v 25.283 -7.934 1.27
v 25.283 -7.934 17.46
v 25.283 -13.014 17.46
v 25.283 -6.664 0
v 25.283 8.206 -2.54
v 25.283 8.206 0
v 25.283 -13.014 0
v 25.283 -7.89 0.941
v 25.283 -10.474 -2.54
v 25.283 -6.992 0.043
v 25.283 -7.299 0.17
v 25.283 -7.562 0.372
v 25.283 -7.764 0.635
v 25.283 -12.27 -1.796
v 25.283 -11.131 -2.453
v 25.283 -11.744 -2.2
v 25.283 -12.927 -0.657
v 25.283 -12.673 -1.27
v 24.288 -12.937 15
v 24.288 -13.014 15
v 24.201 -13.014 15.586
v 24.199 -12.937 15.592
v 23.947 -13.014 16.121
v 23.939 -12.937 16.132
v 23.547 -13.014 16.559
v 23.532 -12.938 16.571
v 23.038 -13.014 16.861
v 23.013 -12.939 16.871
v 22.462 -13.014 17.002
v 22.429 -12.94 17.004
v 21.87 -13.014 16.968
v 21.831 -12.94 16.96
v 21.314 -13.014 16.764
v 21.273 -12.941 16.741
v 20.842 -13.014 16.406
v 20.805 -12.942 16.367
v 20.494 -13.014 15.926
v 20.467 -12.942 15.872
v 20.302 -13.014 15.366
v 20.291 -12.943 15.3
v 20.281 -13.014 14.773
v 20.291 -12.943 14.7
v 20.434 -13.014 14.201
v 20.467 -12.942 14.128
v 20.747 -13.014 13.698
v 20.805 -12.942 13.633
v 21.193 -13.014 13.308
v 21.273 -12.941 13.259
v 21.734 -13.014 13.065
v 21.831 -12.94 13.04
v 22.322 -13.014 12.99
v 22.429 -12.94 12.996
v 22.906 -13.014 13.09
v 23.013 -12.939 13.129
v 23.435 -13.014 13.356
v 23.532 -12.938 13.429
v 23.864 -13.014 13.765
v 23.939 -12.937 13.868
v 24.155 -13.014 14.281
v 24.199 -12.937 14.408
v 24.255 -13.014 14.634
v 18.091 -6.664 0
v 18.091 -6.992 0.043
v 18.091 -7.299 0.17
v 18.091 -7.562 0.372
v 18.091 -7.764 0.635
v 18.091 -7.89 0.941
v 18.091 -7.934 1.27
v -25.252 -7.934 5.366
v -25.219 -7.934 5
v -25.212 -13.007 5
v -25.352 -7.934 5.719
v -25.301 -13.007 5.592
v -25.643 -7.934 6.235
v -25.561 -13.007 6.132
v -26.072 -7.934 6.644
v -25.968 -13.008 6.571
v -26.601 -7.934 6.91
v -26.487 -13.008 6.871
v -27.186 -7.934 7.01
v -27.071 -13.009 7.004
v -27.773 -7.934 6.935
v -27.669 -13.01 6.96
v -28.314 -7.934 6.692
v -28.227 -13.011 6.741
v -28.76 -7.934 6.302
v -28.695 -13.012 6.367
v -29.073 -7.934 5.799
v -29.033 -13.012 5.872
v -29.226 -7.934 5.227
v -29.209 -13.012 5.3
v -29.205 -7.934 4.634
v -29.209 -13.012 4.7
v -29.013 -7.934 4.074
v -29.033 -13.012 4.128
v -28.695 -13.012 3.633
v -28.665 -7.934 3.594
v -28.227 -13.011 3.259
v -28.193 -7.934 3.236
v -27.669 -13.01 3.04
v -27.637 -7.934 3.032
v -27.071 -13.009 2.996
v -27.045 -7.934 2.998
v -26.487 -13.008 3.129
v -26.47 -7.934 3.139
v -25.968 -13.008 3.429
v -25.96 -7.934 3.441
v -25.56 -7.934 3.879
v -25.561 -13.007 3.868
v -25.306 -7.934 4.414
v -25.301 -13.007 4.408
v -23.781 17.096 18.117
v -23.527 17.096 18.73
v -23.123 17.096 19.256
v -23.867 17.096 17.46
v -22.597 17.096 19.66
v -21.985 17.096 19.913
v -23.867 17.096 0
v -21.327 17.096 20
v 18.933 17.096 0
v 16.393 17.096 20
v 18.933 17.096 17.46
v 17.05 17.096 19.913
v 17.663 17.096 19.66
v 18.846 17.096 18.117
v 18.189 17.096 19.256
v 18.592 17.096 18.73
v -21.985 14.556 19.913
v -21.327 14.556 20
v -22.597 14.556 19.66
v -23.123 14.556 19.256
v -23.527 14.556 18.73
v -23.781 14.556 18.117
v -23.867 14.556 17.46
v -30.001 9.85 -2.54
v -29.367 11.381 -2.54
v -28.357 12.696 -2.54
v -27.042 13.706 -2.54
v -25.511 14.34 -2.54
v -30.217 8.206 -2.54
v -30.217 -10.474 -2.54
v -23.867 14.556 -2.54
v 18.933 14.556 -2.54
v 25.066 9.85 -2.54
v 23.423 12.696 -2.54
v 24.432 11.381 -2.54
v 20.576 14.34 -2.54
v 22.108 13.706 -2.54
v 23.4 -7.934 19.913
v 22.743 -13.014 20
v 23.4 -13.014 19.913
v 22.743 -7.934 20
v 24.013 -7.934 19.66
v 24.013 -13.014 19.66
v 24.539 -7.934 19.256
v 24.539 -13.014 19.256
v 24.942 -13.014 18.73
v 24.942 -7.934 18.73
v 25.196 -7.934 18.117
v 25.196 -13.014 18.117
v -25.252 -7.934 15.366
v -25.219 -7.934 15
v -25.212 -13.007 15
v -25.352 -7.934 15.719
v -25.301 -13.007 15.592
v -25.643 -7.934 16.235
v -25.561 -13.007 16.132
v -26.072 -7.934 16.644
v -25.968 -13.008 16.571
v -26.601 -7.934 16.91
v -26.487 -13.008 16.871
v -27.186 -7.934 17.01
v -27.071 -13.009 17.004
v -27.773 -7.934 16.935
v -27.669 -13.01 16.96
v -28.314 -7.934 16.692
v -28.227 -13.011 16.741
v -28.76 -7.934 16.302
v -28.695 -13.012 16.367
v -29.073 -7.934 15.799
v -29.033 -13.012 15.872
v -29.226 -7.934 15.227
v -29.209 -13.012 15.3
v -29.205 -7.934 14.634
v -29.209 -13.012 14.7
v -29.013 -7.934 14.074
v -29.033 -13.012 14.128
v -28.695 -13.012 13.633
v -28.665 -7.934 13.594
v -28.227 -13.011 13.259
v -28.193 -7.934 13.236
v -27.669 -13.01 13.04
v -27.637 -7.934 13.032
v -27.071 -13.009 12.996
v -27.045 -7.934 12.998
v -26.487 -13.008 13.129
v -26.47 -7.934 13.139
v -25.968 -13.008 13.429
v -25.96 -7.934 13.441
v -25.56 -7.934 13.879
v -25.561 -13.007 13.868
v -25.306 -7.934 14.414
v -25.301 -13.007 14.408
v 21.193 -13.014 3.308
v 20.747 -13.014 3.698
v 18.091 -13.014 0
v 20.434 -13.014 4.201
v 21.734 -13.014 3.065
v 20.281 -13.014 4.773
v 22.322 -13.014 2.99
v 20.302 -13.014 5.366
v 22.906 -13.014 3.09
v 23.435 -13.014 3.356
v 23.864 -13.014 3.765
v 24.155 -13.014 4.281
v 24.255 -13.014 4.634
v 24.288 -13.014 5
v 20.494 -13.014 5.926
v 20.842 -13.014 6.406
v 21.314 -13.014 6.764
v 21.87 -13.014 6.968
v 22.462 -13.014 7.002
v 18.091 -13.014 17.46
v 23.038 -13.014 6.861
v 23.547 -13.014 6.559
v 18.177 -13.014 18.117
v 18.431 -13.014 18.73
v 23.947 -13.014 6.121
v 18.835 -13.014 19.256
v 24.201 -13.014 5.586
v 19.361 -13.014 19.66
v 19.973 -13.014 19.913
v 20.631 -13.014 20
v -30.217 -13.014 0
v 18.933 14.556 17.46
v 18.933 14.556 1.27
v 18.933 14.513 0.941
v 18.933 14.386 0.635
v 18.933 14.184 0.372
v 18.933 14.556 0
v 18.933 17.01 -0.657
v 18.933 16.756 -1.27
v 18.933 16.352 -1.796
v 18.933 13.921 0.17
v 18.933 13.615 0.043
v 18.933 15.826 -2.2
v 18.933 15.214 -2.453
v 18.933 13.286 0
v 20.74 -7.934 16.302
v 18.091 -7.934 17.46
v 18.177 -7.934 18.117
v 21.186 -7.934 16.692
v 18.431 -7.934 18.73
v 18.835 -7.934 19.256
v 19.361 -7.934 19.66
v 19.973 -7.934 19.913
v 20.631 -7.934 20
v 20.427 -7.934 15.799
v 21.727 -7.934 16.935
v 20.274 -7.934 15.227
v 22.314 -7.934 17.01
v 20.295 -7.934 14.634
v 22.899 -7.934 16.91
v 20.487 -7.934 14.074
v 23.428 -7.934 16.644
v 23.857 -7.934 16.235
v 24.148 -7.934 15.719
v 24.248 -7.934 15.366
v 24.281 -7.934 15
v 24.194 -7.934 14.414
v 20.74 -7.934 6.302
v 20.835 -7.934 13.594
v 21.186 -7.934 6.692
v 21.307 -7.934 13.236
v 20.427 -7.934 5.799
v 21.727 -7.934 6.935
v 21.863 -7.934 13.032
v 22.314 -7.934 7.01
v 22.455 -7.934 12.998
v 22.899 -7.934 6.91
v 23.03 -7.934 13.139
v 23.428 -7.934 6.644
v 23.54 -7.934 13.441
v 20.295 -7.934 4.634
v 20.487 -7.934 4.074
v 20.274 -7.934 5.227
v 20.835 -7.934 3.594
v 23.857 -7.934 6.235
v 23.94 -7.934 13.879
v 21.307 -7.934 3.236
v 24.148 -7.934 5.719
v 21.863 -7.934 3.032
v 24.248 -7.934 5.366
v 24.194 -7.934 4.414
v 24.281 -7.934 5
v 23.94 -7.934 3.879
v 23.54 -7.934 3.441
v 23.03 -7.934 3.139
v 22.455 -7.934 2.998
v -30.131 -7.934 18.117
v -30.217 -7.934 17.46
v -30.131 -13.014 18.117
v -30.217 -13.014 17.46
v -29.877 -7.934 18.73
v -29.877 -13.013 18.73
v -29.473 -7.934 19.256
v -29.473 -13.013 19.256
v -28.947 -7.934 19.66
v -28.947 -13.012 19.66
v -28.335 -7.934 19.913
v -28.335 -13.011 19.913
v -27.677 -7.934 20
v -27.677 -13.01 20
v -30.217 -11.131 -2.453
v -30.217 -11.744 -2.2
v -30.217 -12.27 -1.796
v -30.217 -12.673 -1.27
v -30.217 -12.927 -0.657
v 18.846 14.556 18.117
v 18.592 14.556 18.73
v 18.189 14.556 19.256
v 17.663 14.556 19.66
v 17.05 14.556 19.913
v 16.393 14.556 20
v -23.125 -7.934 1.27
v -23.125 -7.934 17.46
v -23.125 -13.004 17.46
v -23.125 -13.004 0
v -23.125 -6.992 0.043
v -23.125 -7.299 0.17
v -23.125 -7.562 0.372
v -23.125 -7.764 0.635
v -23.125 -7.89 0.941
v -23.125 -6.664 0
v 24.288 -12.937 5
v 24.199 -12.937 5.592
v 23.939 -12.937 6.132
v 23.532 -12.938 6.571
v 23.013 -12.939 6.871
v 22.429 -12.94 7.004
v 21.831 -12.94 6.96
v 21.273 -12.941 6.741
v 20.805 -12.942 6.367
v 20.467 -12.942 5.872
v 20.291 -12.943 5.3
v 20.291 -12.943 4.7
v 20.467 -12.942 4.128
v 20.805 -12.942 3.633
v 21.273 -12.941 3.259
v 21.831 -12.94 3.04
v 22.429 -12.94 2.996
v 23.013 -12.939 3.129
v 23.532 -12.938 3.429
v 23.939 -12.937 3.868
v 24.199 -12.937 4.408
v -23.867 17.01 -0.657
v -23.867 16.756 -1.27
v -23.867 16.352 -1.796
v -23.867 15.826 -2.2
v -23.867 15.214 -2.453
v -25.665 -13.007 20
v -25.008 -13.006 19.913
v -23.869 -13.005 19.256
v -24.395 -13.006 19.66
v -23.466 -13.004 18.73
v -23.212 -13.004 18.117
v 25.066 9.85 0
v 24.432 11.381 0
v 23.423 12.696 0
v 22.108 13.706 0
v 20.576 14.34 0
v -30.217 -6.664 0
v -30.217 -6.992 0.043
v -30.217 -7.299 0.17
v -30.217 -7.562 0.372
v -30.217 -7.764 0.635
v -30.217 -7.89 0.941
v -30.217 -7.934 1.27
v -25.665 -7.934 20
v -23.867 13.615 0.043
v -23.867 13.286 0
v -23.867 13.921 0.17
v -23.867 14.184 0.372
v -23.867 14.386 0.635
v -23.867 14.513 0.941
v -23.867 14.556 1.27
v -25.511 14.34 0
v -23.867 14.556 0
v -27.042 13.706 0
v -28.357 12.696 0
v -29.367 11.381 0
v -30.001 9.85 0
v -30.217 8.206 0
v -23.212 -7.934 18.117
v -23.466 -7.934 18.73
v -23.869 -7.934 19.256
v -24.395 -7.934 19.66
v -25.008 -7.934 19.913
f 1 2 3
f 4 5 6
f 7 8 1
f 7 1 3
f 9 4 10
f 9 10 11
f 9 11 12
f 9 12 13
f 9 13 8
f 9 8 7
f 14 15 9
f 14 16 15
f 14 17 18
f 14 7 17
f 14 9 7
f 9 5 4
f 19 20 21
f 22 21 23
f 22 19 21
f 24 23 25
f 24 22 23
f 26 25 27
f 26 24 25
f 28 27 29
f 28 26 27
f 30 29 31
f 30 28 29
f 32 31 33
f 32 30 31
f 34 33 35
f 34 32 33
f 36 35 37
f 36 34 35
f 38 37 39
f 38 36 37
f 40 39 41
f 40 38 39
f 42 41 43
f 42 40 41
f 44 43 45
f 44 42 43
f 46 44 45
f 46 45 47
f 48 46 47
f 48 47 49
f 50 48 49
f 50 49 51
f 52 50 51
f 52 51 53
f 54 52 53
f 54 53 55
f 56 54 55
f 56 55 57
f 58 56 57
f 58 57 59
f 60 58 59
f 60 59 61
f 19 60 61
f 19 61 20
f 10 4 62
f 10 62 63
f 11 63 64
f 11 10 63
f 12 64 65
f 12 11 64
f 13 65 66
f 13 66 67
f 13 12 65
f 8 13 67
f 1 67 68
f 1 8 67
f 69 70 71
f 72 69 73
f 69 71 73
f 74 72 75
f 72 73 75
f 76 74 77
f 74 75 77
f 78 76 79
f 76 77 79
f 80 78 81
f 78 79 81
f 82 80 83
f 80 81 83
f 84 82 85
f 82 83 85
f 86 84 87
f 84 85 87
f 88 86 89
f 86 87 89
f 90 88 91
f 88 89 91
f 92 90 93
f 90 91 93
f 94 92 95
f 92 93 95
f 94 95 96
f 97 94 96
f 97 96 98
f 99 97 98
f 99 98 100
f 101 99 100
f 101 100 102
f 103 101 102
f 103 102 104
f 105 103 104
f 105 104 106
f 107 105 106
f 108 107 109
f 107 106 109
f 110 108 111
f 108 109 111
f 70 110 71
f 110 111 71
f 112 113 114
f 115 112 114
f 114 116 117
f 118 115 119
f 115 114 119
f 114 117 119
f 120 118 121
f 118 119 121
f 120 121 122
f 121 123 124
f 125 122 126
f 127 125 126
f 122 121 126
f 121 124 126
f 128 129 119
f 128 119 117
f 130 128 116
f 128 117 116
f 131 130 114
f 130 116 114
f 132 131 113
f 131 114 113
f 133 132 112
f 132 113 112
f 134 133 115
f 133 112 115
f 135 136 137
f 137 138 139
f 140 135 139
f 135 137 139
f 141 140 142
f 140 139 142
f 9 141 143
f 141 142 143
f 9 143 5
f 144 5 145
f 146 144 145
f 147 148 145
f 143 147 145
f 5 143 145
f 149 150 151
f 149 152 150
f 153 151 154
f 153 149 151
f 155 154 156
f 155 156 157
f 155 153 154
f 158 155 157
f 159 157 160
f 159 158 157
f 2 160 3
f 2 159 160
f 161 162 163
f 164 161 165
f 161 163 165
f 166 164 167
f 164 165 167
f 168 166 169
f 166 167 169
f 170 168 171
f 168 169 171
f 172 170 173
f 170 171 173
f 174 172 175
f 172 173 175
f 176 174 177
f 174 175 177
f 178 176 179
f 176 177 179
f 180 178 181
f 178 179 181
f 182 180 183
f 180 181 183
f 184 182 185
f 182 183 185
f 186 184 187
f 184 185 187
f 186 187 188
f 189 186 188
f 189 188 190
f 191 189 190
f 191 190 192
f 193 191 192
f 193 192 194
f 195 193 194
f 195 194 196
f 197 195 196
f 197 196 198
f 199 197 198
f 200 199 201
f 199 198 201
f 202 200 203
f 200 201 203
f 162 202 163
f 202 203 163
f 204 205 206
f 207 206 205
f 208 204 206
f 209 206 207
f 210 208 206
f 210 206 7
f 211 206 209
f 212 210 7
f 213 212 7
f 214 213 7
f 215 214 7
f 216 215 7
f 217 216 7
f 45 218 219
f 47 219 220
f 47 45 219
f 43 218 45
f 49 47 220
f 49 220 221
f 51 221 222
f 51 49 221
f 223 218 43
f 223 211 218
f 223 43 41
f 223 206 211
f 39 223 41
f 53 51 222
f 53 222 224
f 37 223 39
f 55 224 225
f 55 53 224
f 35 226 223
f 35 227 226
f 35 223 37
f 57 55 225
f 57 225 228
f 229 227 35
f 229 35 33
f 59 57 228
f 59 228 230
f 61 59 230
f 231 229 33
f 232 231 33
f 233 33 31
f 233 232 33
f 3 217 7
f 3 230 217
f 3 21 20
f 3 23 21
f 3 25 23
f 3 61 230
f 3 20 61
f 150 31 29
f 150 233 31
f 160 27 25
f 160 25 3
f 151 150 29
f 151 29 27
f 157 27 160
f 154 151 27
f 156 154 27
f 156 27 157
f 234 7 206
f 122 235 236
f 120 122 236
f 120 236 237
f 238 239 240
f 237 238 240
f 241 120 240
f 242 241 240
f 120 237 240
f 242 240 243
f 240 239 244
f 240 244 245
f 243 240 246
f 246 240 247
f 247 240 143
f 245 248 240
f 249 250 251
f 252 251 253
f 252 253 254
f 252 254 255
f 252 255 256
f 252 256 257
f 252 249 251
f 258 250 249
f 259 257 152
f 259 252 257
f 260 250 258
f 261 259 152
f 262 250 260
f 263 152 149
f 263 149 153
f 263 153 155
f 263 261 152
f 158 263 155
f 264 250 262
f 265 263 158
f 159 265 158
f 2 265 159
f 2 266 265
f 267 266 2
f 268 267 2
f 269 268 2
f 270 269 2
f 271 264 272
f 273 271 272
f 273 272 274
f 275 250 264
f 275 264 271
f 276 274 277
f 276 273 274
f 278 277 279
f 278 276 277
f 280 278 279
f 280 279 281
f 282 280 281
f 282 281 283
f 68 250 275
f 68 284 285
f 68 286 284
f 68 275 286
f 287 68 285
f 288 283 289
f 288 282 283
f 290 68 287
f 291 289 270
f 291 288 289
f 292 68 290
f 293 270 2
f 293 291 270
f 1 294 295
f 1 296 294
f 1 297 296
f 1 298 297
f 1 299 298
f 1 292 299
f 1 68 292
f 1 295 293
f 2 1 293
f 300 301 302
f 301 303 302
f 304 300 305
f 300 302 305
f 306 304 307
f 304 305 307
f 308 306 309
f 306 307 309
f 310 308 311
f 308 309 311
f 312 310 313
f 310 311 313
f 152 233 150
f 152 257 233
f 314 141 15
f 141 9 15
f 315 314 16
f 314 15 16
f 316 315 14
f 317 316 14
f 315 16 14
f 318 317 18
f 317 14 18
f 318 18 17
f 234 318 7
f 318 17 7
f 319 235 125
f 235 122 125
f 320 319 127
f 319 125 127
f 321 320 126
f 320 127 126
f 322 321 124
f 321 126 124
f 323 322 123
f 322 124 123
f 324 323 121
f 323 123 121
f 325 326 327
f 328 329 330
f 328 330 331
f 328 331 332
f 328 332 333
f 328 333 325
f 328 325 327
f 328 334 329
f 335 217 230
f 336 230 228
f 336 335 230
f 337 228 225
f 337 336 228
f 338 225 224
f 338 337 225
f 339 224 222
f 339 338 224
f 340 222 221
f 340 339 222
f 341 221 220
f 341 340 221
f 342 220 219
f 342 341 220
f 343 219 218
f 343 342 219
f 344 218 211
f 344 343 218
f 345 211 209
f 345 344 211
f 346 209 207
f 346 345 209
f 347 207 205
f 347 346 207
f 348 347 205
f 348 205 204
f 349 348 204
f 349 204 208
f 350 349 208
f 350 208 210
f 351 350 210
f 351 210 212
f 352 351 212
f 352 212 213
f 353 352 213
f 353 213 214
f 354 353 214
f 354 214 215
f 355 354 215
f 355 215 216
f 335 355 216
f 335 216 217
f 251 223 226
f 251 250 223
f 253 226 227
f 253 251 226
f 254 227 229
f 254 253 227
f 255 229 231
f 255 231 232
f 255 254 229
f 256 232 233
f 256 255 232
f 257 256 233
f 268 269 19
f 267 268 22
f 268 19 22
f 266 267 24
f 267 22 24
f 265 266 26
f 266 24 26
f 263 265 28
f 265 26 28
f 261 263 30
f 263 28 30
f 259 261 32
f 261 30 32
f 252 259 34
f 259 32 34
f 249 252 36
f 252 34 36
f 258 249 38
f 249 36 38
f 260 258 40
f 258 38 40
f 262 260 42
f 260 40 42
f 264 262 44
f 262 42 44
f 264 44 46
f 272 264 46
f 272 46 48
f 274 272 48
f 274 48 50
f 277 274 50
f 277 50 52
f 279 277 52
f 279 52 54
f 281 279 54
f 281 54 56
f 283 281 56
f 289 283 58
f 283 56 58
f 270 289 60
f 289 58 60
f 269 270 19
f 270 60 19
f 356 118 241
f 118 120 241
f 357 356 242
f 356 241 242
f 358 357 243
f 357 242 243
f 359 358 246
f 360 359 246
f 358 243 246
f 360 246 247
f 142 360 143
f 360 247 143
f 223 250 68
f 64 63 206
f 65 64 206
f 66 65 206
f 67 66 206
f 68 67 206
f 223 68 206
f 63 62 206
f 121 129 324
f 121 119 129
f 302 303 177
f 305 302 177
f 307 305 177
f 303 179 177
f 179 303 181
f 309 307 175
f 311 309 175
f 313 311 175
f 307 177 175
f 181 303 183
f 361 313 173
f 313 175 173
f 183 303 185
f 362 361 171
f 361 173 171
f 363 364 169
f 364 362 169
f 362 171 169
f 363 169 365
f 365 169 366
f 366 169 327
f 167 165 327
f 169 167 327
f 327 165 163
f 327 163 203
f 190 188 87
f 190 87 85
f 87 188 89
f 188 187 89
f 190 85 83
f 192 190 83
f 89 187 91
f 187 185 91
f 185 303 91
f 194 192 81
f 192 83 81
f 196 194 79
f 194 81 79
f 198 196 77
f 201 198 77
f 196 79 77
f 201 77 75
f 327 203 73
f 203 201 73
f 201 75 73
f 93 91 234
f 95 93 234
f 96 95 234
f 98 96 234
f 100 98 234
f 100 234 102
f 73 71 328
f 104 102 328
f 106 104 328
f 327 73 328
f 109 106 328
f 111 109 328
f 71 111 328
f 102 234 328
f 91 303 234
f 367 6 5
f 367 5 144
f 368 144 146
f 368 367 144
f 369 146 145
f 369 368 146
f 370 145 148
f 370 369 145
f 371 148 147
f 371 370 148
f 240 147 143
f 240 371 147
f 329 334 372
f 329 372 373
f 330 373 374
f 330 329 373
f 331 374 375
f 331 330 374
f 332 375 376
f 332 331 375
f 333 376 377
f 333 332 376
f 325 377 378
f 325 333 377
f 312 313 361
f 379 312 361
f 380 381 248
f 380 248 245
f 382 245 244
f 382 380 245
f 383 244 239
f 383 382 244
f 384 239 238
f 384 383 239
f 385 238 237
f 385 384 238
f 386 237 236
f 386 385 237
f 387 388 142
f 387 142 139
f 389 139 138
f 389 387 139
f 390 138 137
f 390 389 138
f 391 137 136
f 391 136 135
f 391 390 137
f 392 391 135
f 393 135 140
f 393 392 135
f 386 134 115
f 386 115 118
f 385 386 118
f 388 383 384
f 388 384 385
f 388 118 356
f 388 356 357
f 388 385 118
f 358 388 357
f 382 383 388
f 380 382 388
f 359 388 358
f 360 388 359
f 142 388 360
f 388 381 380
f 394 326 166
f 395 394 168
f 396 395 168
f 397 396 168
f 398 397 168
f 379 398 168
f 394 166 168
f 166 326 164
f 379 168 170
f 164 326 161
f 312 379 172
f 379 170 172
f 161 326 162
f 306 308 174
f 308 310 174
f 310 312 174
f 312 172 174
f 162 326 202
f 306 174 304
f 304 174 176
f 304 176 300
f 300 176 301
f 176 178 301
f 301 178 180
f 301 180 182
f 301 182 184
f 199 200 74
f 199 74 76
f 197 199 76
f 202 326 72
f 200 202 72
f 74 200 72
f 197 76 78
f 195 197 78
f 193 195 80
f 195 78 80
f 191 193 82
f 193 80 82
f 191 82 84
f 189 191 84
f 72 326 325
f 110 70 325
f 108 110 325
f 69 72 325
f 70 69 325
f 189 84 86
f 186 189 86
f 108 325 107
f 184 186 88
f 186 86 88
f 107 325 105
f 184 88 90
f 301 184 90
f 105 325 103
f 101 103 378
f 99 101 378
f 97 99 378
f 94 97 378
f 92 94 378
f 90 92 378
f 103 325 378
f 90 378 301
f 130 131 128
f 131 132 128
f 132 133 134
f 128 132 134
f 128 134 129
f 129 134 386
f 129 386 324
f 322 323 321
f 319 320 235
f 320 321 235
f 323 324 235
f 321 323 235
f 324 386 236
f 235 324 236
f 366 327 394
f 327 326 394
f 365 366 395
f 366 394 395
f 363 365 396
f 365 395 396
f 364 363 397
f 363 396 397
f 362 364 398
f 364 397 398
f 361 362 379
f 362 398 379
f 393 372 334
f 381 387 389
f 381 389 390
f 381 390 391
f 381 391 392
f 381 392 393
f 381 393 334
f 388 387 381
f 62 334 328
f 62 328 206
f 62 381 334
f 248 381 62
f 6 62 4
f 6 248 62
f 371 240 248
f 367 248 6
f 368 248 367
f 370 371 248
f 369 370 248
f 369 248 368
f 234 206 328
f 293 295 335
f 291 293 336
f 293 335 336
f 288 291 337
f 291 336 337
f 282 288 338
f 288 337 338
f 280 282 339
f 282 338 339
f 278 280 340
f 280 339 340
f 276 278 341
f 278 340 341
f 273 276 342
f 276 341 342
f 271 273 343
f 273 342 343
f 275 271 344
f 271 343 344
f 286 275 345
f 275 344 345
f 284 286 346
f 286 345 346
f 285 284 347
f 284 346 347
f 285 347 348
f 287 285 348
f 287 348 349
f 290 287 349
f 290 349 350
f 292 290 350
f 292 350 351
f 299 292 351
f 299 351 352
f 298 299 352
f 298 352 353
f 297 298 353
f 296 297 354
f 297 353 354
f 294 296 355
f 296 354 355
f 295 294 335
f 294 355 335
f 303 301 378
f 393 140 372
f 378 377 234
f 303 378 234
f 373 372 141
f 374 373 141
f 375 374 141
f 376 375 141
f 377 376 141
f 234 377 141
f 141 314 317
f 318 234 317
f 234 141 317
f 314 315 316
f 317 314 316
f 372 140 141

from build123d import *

# Parameters (mm, degrees)
SKETCH2_W                      = 42.8
SKETCH2_H                      = 2.54
BOSS_EXTRUDE1_DEPTH            = 2.54
SKETCH7_W                      = 7.192
SKETCH7_H                      = 5.08
SKETCH7_W_2                    = 42.8
SKETCH7_H_2                    = 2.54
BOSS_EXTRUDE3_DEPTH            = 20
FILLET3_R                      = 2.54
FILLET4_R                      = 1.27
CUT_EXTRUDE2_REACH             = 49.098
SKETCH8_R                      = 2.01
CUT_EXTRUDE2_DIRECTION_2_REACH = 49.098


# Some blends are built 0.0001 mm under size
with BuildPart() as part:
    # Sketch2 → Boss-Extrude1 (new body)
    with BuildSketch(Plane.XY):
        with Locations((-2.467346939, 15.826258503)):
            Rectangle(SKETCH2_W, SKETCH2_H)
        with BuildLine():
            Line((18.932653061, 14.556258503), (-23.867346939, 14.556258503))
            ThreePointArc((-23.867346939, 14.556258503), (-28.357474999, 12.696386564), (-30.217346939, 8.206258503))
            Line((-30.217346939, 8.206258503), (-30.217346939, -13.013741497))
            Line((-30.217346939, -13.013741497), (25.282653061, -13.013741497))
            Line((25.282653061, -13.013741497), (25.282653061, 8.206258503))
            ThreePointArc((25.282653061, 8.206258503), (23.422781122, 12.696386564), (18.932653061, 14.556258503))
        make_face()
    extrude(amount=-BOSS_EXTRUDE1_DEPTH)

    # Sketch7 → Boss-Extrude3 (add)
    with BuildSketch(Plane.XY):
        Polygon((-30.217346939, -7.933741497), (-30.217346939, -13.013741497), (-23.125346939, -13.003741497), (-23.125346939, -7.933741497), align=None)
        with Locations((21.686653061, -10.473741497)):
            Rectangle(SKETCH7_W, SKETCH7_H)
        with Locations((-2.467346939, 15.826258503)):
            Rectangle(SKETCH7_W_2, SKETCH7_H_2)
    extrude(amount=BOSS_EXTRUDE3_DEPTH)

    # Fillet3
    fillet3_edges = [part.edges().sort_by_distance(p)[0] for p in [
        (-2.467346939, 17.096258503, -2.54),
        (18.932653061, 15.826258503, 20),
        (-23.867346939, 15.826258503, 20),
        (-2.467346939, -13.013741497, -2.54),
        (18.090653061, -10.473741497, 20),
        (25.282653061, -10.473741497, 20),
        (-23.125346939, -10.468741497, 20),
        (-30.217346939, -10.473741497, 20),
    ]]
    fillet(fillet3_edges, radius=FILLET3_R - 0.0001)  # a hair under: the kernel refuses the full size

    # Fillet4
    # the kernel refuses this fillet: 1.27 mm, written as the material it adds along each edge
    with BuildSketch(Plane(origin=(-23.125346939, -7.933741497, 0), x_dir=(0, 1, 0), z_dir=(-1, 0, 0))) as fillet4_piece_1:
        with BuildLine():
            CenterArc((FILLET4_R, -FILLET4_R), FILLET4_R, 90, 90)
            Line((0, -FILLET4_R), (0, 0))
            Line((0, 0), (FILLET4_R, 0))
        make_face()
    extrude(amount=7.092)
    with BuildSketch(Plane(origin=(25.282653061, -7.933741497, 0), x_dir=(0, 1, 0), z_dir=(-1, 0, 0))) as fillet4_piece_2:
        with BuildLine():
            CenterArc((FILLET4_R, -FILLET4_R), FILLET4_R, 90, 90)
            Line((0, -FILLET4_R), (0, 0))
            Line((0, 0), (FILLET4_R, 0))
        make_face()
    extrude(amount=7.192)
    with BuildSketch(Plane(origin=(-23.867346939, 14.556258503, 0), x_dir=(0, 0, 1), z_dir=(1, 0, 0))) as fillet4_piece_3:
        with BuildLine():
            CenterArc((FILLET4_R, FILLET4_R), FILLET4_R, 180, 90)
            Line((0, FILLET4_R), (0, 0))
            Line((0, 0), (FILLET4_R, 0))
        make_face()
    extrude(amount=42.8)

    # Cut-Extrude2: up to this face of the body (flat: up to its plane)
    cut_extrude2_end = Plane(part.part.faces().sort_by_distance((-26.671346939, -7.933741497, 10.447713694))[0])
    # Sketch8 → Cut-Extrude2 (cut, up to the picked face)
    with BuildSketch(Plane(origin=(0.018289774, -12.971108055, 0), x_dir=(0.9999990058958133, 0.0014100380793790163, 0), z_dir=(0.0014100380793790163, -0.9999990058958133, 0)), mode=Mode.PRIVATE) as cut_extrude2_sk1:
        with Locations((-27.239885767, 5)):
            Circle(SKETCH8_R)
    cut_extrude2_tool1 = split(extrude(cut_extrude2_sk1.sketch, amount=-CUT_EXTRUDE2_REACH, mode=Mode.PRIVATE), bisect_by=cut_extrude2_end, keep=Keep.BOTH, mode=Mode.PRIVATE)
    # Sketch8 → Cut-Extrude2 (cut, up to the picked face)
    with BuildSketch(Plane(origin=(0.018289774, -12.971108055, 0), x_dir=(0.9999990058958133, 0.0014100380793790163, 0), z_dir=(0.0014100380793790163, -0.9999990058958133, 0)), mode=Mode.PRIVATE) as cut_extrude2_sk2:
        with Locations((22.260065025, 5)):
            Circle(SKETCH8_R)
    cut_extrude2_tool2 = split(extrude(cut_extrude2_sk2.sketch, amount=-CUT_EXTRUDE2_REACH, mode=Mode.PRIVATE), bisect_by=cut_extrude2_end, keep=Keep.BOTH, mode=Mode.PRIVATE)
    # Sketch8 → Cut-Extrude2 (cut, up to the picked face)
    with BuildSketch(Plane(origin=(0.018289774, -12.971108055, 0), x_dir=(0.9999990058958133, 0.0014100380793790163, 0), z_dir=(0.0014100380793790163, -0.9999990058958133, 0)), mode=Mode.PRIVATE) as cut_extrude2_sk3:
        with Locations((22.260065025, 15)):
            Circle(SKETCH8_R)
    cut_extrude2_tool3 = split(extrude(cut_extrude2_sk3.sketch, amount=-CUT_EXTRUDE2_REACH, mode=Mode.PRIVATE), bisect_by=cut_extrude2_end, keep=Keep.BOTH, mode=Mode.PRIVATE)
    # Sketch8 → Cut-Extrude2 (cut, up to the picked face)
    with BuildSketch(Plane(origin=(0.018289774, -12.971108055, 0), x_dir=(0.9999990058958133, 0.0014100380793790163, 0), z_dir=(0.0014100380793790163, -0.9999990058958133, 0)), mode=Mode.PRIVATE) as cut_extrude2_sk4:
        with Locations((-27.239885767, 15)):
            Circle(SKETCH8_R)
    cut_extrude2_tool4 = split(extrude(cut_extrude2_sk4.sketch, amount=-CUT_EXTRUDE2_REACH, mode=Mode.PRIVATE), bisect_by=cut_extrude2_end, keep=Keep.BOTH, mode=Mode.PRIVATE)
    add(cut_extrude2_tool1.solids().sort_by(Axis((-27.221569, -13.009517, 5), (-0.0014100380793790163, 0.9999990058958133, 0)))[0], mode=Mode.SUBTRACT)
    add(cut_extrude2_tool2.solids().sort_by(Axis((22.278333, -12.939721, 5), (-0.0014100380793790163, 0.9999990058958133, 0)))[0], mode=Mode.SUBTRACT)
    add(cut_extrude2_tool3.solids().sort_by(Axis((22.278333, -12.939721, 15), (-0.0014100380793790163, 0.9999990058958133, 0)))[0], mode=Mode.SUBTRACT)
    add(cut_extrude2_tool4.solids().sort_by(Axis((-27.221569, -13.009517, 15), (-0.0014100380793790163, 0.9999990058958133, 0)))[0], mode=Mode.SUBTRACT)

    # Cut-Extrude2 direction 2: up to this face of the body (flat: up to its plane)
    cut_extrude2_direction_2_end = Plane(part.part.faces().sort_by_distance((21.685702836, -13.013741497, 9.814476997))[0])
    # Sketch8 → Cut-Extrude2 direction 2 (cut, up to the picked face)
    with BuildSketch(Plane(origin=(0.018289774, -12.971108055, 0), x_dir=(0.9999990058958133, 0.0014100380793790163, 0), z_dir=(0.0014100380793790163, -0.9999990058958133, 0)), mode=Mode.PRIVATE) as cut_extrude2_direction_2_sk1:
        with Locations((-27.239885767, 5)):
            Circle(SKETCH8_R)
    cut_extrude2_direction_2_tool1 = split(extrude(cut_extrude2_direction_2_sk1.sketch, amount=CUT_EXTRUDE2_DIRECTION_2_REACH, mode=Mode.PRIVATE), bisect_by=cut_extrude2_direction_2_end, keep=Keep.BOTH, mode=Mode.PRIVATE)
    # Sketch8 → Cut-Extrude2 direction 2 (cut, up to the picked face)
    with BuildSketch(Plane(origin=(0.018289774, -12.971108055, 0), x_dir=(0.9999990058958133, 0.0014100380793790163, 0), z_dir=(0.0014100380793790163, -0.9999990058958133, 0)), mode=Mode.PRIVATE) as cut_extrude2_direction_2_sk2:
        with Locations((22.260065025, 5)):
            Circle(SKETCH8_R)
    cut_extrude2_direction_2_tool2 = split(extrude(cut_extrude2_direction_2_sk2.sketch, amount=CUT_EXTRUDE2_DIRECTION_2_REACH, mode=Mode.PRIVATE), bisect_by=cut_extrude2_direction_2_end, keep=Keep.BOTH, mode=Mode.PRIVATE)
    # Sketch8 → Cut-Extrude2 direction 2 (cut, up to the picked face)
    with BuildSketch(Plane(origin=(0.018289774, -12.971108055, 0), x_dir=(0.9999990058958133, 0.0014100380793790163, 0), z_dir=(0.0014100380793790163, -0.9999990058958133, 0)), mode=Mode.PRIVATE) as cut_extrude2_direction_2_sk3:
        with Locations((22.260065025, 15)):
            Circle(SKETCH8_R)
    cut_extrude2_direction_2_tool3 = split(extrude(cut_extrude2_direction_2_sk3.sketch, amount=CUT_EXTRUDE2_DIRECTION_2_REACH, mode=Mode.PRIVATE), bisect_by=cut_extrude2_direction_2_end, keep=Keep.BOTH, mode=Mode.PRIVATE)
    # Sketch8 → Cut-Extrude2 direction 2 (cut, up to the picked face)
    with BuildSketch(Plane(origin=(0.018289774, -12.971108055, 0), x_dir=(0.9999990058958133, 0.0014100380793790163, 0), z_dir=(0.0014100380793790163, -0.9999990058958133, 0)), mode=Mode.PRIVATE) as cut_extrude2_direction_2_sk4:
        with Locations((-27.239885767, 15)):
            Circle(SKETCH8_R)
    cut_extrude2_direction_2_tool4 = split(extrude(cut_extrude2_direction_2_sk4.sketch, amount=CUT_EXTRUDE2_DIRECTION_2_REACH, mode=Mode.PRIVATE), bisect_by=cut_extrude2_direction_2_end, keep=Keep.BOTH, mode=Mode.PRIVATE)
    add(cut_extrude2_direction_2_tool1.solids().sort_by(Axis((-27.221569, -13.009517, 5), (0.0014100380793790163, -0.9999990058958133, 0)))[0], mode=Mode.SUBTRACT)
    add(cut_extrude2_direction_2_tool2.solids().sort_by(Axis((22.278333, -12.939721, 5), (0.0014100380793790163, -0.9999990058958133, 0)))[0], mode=Mode.SUBTRACT)
    add(cut_extrude2_direction_2_tool3.solids().sort_by(Axis((22.278333, -12.939721, 15), (0.0014100380793790163, -0.9999990058958133, 0)))[0], mode=Mode.SUBTRACT)
    add(cut_extrude2_direction_2_tool4.solids().sort_by(Axis((-27.221569, -13.009517, 15), (0.0014100380793790163, -0.9999990058958133, 0)))[0], mode=Mode.SUBTRACT)


solid = part.part
